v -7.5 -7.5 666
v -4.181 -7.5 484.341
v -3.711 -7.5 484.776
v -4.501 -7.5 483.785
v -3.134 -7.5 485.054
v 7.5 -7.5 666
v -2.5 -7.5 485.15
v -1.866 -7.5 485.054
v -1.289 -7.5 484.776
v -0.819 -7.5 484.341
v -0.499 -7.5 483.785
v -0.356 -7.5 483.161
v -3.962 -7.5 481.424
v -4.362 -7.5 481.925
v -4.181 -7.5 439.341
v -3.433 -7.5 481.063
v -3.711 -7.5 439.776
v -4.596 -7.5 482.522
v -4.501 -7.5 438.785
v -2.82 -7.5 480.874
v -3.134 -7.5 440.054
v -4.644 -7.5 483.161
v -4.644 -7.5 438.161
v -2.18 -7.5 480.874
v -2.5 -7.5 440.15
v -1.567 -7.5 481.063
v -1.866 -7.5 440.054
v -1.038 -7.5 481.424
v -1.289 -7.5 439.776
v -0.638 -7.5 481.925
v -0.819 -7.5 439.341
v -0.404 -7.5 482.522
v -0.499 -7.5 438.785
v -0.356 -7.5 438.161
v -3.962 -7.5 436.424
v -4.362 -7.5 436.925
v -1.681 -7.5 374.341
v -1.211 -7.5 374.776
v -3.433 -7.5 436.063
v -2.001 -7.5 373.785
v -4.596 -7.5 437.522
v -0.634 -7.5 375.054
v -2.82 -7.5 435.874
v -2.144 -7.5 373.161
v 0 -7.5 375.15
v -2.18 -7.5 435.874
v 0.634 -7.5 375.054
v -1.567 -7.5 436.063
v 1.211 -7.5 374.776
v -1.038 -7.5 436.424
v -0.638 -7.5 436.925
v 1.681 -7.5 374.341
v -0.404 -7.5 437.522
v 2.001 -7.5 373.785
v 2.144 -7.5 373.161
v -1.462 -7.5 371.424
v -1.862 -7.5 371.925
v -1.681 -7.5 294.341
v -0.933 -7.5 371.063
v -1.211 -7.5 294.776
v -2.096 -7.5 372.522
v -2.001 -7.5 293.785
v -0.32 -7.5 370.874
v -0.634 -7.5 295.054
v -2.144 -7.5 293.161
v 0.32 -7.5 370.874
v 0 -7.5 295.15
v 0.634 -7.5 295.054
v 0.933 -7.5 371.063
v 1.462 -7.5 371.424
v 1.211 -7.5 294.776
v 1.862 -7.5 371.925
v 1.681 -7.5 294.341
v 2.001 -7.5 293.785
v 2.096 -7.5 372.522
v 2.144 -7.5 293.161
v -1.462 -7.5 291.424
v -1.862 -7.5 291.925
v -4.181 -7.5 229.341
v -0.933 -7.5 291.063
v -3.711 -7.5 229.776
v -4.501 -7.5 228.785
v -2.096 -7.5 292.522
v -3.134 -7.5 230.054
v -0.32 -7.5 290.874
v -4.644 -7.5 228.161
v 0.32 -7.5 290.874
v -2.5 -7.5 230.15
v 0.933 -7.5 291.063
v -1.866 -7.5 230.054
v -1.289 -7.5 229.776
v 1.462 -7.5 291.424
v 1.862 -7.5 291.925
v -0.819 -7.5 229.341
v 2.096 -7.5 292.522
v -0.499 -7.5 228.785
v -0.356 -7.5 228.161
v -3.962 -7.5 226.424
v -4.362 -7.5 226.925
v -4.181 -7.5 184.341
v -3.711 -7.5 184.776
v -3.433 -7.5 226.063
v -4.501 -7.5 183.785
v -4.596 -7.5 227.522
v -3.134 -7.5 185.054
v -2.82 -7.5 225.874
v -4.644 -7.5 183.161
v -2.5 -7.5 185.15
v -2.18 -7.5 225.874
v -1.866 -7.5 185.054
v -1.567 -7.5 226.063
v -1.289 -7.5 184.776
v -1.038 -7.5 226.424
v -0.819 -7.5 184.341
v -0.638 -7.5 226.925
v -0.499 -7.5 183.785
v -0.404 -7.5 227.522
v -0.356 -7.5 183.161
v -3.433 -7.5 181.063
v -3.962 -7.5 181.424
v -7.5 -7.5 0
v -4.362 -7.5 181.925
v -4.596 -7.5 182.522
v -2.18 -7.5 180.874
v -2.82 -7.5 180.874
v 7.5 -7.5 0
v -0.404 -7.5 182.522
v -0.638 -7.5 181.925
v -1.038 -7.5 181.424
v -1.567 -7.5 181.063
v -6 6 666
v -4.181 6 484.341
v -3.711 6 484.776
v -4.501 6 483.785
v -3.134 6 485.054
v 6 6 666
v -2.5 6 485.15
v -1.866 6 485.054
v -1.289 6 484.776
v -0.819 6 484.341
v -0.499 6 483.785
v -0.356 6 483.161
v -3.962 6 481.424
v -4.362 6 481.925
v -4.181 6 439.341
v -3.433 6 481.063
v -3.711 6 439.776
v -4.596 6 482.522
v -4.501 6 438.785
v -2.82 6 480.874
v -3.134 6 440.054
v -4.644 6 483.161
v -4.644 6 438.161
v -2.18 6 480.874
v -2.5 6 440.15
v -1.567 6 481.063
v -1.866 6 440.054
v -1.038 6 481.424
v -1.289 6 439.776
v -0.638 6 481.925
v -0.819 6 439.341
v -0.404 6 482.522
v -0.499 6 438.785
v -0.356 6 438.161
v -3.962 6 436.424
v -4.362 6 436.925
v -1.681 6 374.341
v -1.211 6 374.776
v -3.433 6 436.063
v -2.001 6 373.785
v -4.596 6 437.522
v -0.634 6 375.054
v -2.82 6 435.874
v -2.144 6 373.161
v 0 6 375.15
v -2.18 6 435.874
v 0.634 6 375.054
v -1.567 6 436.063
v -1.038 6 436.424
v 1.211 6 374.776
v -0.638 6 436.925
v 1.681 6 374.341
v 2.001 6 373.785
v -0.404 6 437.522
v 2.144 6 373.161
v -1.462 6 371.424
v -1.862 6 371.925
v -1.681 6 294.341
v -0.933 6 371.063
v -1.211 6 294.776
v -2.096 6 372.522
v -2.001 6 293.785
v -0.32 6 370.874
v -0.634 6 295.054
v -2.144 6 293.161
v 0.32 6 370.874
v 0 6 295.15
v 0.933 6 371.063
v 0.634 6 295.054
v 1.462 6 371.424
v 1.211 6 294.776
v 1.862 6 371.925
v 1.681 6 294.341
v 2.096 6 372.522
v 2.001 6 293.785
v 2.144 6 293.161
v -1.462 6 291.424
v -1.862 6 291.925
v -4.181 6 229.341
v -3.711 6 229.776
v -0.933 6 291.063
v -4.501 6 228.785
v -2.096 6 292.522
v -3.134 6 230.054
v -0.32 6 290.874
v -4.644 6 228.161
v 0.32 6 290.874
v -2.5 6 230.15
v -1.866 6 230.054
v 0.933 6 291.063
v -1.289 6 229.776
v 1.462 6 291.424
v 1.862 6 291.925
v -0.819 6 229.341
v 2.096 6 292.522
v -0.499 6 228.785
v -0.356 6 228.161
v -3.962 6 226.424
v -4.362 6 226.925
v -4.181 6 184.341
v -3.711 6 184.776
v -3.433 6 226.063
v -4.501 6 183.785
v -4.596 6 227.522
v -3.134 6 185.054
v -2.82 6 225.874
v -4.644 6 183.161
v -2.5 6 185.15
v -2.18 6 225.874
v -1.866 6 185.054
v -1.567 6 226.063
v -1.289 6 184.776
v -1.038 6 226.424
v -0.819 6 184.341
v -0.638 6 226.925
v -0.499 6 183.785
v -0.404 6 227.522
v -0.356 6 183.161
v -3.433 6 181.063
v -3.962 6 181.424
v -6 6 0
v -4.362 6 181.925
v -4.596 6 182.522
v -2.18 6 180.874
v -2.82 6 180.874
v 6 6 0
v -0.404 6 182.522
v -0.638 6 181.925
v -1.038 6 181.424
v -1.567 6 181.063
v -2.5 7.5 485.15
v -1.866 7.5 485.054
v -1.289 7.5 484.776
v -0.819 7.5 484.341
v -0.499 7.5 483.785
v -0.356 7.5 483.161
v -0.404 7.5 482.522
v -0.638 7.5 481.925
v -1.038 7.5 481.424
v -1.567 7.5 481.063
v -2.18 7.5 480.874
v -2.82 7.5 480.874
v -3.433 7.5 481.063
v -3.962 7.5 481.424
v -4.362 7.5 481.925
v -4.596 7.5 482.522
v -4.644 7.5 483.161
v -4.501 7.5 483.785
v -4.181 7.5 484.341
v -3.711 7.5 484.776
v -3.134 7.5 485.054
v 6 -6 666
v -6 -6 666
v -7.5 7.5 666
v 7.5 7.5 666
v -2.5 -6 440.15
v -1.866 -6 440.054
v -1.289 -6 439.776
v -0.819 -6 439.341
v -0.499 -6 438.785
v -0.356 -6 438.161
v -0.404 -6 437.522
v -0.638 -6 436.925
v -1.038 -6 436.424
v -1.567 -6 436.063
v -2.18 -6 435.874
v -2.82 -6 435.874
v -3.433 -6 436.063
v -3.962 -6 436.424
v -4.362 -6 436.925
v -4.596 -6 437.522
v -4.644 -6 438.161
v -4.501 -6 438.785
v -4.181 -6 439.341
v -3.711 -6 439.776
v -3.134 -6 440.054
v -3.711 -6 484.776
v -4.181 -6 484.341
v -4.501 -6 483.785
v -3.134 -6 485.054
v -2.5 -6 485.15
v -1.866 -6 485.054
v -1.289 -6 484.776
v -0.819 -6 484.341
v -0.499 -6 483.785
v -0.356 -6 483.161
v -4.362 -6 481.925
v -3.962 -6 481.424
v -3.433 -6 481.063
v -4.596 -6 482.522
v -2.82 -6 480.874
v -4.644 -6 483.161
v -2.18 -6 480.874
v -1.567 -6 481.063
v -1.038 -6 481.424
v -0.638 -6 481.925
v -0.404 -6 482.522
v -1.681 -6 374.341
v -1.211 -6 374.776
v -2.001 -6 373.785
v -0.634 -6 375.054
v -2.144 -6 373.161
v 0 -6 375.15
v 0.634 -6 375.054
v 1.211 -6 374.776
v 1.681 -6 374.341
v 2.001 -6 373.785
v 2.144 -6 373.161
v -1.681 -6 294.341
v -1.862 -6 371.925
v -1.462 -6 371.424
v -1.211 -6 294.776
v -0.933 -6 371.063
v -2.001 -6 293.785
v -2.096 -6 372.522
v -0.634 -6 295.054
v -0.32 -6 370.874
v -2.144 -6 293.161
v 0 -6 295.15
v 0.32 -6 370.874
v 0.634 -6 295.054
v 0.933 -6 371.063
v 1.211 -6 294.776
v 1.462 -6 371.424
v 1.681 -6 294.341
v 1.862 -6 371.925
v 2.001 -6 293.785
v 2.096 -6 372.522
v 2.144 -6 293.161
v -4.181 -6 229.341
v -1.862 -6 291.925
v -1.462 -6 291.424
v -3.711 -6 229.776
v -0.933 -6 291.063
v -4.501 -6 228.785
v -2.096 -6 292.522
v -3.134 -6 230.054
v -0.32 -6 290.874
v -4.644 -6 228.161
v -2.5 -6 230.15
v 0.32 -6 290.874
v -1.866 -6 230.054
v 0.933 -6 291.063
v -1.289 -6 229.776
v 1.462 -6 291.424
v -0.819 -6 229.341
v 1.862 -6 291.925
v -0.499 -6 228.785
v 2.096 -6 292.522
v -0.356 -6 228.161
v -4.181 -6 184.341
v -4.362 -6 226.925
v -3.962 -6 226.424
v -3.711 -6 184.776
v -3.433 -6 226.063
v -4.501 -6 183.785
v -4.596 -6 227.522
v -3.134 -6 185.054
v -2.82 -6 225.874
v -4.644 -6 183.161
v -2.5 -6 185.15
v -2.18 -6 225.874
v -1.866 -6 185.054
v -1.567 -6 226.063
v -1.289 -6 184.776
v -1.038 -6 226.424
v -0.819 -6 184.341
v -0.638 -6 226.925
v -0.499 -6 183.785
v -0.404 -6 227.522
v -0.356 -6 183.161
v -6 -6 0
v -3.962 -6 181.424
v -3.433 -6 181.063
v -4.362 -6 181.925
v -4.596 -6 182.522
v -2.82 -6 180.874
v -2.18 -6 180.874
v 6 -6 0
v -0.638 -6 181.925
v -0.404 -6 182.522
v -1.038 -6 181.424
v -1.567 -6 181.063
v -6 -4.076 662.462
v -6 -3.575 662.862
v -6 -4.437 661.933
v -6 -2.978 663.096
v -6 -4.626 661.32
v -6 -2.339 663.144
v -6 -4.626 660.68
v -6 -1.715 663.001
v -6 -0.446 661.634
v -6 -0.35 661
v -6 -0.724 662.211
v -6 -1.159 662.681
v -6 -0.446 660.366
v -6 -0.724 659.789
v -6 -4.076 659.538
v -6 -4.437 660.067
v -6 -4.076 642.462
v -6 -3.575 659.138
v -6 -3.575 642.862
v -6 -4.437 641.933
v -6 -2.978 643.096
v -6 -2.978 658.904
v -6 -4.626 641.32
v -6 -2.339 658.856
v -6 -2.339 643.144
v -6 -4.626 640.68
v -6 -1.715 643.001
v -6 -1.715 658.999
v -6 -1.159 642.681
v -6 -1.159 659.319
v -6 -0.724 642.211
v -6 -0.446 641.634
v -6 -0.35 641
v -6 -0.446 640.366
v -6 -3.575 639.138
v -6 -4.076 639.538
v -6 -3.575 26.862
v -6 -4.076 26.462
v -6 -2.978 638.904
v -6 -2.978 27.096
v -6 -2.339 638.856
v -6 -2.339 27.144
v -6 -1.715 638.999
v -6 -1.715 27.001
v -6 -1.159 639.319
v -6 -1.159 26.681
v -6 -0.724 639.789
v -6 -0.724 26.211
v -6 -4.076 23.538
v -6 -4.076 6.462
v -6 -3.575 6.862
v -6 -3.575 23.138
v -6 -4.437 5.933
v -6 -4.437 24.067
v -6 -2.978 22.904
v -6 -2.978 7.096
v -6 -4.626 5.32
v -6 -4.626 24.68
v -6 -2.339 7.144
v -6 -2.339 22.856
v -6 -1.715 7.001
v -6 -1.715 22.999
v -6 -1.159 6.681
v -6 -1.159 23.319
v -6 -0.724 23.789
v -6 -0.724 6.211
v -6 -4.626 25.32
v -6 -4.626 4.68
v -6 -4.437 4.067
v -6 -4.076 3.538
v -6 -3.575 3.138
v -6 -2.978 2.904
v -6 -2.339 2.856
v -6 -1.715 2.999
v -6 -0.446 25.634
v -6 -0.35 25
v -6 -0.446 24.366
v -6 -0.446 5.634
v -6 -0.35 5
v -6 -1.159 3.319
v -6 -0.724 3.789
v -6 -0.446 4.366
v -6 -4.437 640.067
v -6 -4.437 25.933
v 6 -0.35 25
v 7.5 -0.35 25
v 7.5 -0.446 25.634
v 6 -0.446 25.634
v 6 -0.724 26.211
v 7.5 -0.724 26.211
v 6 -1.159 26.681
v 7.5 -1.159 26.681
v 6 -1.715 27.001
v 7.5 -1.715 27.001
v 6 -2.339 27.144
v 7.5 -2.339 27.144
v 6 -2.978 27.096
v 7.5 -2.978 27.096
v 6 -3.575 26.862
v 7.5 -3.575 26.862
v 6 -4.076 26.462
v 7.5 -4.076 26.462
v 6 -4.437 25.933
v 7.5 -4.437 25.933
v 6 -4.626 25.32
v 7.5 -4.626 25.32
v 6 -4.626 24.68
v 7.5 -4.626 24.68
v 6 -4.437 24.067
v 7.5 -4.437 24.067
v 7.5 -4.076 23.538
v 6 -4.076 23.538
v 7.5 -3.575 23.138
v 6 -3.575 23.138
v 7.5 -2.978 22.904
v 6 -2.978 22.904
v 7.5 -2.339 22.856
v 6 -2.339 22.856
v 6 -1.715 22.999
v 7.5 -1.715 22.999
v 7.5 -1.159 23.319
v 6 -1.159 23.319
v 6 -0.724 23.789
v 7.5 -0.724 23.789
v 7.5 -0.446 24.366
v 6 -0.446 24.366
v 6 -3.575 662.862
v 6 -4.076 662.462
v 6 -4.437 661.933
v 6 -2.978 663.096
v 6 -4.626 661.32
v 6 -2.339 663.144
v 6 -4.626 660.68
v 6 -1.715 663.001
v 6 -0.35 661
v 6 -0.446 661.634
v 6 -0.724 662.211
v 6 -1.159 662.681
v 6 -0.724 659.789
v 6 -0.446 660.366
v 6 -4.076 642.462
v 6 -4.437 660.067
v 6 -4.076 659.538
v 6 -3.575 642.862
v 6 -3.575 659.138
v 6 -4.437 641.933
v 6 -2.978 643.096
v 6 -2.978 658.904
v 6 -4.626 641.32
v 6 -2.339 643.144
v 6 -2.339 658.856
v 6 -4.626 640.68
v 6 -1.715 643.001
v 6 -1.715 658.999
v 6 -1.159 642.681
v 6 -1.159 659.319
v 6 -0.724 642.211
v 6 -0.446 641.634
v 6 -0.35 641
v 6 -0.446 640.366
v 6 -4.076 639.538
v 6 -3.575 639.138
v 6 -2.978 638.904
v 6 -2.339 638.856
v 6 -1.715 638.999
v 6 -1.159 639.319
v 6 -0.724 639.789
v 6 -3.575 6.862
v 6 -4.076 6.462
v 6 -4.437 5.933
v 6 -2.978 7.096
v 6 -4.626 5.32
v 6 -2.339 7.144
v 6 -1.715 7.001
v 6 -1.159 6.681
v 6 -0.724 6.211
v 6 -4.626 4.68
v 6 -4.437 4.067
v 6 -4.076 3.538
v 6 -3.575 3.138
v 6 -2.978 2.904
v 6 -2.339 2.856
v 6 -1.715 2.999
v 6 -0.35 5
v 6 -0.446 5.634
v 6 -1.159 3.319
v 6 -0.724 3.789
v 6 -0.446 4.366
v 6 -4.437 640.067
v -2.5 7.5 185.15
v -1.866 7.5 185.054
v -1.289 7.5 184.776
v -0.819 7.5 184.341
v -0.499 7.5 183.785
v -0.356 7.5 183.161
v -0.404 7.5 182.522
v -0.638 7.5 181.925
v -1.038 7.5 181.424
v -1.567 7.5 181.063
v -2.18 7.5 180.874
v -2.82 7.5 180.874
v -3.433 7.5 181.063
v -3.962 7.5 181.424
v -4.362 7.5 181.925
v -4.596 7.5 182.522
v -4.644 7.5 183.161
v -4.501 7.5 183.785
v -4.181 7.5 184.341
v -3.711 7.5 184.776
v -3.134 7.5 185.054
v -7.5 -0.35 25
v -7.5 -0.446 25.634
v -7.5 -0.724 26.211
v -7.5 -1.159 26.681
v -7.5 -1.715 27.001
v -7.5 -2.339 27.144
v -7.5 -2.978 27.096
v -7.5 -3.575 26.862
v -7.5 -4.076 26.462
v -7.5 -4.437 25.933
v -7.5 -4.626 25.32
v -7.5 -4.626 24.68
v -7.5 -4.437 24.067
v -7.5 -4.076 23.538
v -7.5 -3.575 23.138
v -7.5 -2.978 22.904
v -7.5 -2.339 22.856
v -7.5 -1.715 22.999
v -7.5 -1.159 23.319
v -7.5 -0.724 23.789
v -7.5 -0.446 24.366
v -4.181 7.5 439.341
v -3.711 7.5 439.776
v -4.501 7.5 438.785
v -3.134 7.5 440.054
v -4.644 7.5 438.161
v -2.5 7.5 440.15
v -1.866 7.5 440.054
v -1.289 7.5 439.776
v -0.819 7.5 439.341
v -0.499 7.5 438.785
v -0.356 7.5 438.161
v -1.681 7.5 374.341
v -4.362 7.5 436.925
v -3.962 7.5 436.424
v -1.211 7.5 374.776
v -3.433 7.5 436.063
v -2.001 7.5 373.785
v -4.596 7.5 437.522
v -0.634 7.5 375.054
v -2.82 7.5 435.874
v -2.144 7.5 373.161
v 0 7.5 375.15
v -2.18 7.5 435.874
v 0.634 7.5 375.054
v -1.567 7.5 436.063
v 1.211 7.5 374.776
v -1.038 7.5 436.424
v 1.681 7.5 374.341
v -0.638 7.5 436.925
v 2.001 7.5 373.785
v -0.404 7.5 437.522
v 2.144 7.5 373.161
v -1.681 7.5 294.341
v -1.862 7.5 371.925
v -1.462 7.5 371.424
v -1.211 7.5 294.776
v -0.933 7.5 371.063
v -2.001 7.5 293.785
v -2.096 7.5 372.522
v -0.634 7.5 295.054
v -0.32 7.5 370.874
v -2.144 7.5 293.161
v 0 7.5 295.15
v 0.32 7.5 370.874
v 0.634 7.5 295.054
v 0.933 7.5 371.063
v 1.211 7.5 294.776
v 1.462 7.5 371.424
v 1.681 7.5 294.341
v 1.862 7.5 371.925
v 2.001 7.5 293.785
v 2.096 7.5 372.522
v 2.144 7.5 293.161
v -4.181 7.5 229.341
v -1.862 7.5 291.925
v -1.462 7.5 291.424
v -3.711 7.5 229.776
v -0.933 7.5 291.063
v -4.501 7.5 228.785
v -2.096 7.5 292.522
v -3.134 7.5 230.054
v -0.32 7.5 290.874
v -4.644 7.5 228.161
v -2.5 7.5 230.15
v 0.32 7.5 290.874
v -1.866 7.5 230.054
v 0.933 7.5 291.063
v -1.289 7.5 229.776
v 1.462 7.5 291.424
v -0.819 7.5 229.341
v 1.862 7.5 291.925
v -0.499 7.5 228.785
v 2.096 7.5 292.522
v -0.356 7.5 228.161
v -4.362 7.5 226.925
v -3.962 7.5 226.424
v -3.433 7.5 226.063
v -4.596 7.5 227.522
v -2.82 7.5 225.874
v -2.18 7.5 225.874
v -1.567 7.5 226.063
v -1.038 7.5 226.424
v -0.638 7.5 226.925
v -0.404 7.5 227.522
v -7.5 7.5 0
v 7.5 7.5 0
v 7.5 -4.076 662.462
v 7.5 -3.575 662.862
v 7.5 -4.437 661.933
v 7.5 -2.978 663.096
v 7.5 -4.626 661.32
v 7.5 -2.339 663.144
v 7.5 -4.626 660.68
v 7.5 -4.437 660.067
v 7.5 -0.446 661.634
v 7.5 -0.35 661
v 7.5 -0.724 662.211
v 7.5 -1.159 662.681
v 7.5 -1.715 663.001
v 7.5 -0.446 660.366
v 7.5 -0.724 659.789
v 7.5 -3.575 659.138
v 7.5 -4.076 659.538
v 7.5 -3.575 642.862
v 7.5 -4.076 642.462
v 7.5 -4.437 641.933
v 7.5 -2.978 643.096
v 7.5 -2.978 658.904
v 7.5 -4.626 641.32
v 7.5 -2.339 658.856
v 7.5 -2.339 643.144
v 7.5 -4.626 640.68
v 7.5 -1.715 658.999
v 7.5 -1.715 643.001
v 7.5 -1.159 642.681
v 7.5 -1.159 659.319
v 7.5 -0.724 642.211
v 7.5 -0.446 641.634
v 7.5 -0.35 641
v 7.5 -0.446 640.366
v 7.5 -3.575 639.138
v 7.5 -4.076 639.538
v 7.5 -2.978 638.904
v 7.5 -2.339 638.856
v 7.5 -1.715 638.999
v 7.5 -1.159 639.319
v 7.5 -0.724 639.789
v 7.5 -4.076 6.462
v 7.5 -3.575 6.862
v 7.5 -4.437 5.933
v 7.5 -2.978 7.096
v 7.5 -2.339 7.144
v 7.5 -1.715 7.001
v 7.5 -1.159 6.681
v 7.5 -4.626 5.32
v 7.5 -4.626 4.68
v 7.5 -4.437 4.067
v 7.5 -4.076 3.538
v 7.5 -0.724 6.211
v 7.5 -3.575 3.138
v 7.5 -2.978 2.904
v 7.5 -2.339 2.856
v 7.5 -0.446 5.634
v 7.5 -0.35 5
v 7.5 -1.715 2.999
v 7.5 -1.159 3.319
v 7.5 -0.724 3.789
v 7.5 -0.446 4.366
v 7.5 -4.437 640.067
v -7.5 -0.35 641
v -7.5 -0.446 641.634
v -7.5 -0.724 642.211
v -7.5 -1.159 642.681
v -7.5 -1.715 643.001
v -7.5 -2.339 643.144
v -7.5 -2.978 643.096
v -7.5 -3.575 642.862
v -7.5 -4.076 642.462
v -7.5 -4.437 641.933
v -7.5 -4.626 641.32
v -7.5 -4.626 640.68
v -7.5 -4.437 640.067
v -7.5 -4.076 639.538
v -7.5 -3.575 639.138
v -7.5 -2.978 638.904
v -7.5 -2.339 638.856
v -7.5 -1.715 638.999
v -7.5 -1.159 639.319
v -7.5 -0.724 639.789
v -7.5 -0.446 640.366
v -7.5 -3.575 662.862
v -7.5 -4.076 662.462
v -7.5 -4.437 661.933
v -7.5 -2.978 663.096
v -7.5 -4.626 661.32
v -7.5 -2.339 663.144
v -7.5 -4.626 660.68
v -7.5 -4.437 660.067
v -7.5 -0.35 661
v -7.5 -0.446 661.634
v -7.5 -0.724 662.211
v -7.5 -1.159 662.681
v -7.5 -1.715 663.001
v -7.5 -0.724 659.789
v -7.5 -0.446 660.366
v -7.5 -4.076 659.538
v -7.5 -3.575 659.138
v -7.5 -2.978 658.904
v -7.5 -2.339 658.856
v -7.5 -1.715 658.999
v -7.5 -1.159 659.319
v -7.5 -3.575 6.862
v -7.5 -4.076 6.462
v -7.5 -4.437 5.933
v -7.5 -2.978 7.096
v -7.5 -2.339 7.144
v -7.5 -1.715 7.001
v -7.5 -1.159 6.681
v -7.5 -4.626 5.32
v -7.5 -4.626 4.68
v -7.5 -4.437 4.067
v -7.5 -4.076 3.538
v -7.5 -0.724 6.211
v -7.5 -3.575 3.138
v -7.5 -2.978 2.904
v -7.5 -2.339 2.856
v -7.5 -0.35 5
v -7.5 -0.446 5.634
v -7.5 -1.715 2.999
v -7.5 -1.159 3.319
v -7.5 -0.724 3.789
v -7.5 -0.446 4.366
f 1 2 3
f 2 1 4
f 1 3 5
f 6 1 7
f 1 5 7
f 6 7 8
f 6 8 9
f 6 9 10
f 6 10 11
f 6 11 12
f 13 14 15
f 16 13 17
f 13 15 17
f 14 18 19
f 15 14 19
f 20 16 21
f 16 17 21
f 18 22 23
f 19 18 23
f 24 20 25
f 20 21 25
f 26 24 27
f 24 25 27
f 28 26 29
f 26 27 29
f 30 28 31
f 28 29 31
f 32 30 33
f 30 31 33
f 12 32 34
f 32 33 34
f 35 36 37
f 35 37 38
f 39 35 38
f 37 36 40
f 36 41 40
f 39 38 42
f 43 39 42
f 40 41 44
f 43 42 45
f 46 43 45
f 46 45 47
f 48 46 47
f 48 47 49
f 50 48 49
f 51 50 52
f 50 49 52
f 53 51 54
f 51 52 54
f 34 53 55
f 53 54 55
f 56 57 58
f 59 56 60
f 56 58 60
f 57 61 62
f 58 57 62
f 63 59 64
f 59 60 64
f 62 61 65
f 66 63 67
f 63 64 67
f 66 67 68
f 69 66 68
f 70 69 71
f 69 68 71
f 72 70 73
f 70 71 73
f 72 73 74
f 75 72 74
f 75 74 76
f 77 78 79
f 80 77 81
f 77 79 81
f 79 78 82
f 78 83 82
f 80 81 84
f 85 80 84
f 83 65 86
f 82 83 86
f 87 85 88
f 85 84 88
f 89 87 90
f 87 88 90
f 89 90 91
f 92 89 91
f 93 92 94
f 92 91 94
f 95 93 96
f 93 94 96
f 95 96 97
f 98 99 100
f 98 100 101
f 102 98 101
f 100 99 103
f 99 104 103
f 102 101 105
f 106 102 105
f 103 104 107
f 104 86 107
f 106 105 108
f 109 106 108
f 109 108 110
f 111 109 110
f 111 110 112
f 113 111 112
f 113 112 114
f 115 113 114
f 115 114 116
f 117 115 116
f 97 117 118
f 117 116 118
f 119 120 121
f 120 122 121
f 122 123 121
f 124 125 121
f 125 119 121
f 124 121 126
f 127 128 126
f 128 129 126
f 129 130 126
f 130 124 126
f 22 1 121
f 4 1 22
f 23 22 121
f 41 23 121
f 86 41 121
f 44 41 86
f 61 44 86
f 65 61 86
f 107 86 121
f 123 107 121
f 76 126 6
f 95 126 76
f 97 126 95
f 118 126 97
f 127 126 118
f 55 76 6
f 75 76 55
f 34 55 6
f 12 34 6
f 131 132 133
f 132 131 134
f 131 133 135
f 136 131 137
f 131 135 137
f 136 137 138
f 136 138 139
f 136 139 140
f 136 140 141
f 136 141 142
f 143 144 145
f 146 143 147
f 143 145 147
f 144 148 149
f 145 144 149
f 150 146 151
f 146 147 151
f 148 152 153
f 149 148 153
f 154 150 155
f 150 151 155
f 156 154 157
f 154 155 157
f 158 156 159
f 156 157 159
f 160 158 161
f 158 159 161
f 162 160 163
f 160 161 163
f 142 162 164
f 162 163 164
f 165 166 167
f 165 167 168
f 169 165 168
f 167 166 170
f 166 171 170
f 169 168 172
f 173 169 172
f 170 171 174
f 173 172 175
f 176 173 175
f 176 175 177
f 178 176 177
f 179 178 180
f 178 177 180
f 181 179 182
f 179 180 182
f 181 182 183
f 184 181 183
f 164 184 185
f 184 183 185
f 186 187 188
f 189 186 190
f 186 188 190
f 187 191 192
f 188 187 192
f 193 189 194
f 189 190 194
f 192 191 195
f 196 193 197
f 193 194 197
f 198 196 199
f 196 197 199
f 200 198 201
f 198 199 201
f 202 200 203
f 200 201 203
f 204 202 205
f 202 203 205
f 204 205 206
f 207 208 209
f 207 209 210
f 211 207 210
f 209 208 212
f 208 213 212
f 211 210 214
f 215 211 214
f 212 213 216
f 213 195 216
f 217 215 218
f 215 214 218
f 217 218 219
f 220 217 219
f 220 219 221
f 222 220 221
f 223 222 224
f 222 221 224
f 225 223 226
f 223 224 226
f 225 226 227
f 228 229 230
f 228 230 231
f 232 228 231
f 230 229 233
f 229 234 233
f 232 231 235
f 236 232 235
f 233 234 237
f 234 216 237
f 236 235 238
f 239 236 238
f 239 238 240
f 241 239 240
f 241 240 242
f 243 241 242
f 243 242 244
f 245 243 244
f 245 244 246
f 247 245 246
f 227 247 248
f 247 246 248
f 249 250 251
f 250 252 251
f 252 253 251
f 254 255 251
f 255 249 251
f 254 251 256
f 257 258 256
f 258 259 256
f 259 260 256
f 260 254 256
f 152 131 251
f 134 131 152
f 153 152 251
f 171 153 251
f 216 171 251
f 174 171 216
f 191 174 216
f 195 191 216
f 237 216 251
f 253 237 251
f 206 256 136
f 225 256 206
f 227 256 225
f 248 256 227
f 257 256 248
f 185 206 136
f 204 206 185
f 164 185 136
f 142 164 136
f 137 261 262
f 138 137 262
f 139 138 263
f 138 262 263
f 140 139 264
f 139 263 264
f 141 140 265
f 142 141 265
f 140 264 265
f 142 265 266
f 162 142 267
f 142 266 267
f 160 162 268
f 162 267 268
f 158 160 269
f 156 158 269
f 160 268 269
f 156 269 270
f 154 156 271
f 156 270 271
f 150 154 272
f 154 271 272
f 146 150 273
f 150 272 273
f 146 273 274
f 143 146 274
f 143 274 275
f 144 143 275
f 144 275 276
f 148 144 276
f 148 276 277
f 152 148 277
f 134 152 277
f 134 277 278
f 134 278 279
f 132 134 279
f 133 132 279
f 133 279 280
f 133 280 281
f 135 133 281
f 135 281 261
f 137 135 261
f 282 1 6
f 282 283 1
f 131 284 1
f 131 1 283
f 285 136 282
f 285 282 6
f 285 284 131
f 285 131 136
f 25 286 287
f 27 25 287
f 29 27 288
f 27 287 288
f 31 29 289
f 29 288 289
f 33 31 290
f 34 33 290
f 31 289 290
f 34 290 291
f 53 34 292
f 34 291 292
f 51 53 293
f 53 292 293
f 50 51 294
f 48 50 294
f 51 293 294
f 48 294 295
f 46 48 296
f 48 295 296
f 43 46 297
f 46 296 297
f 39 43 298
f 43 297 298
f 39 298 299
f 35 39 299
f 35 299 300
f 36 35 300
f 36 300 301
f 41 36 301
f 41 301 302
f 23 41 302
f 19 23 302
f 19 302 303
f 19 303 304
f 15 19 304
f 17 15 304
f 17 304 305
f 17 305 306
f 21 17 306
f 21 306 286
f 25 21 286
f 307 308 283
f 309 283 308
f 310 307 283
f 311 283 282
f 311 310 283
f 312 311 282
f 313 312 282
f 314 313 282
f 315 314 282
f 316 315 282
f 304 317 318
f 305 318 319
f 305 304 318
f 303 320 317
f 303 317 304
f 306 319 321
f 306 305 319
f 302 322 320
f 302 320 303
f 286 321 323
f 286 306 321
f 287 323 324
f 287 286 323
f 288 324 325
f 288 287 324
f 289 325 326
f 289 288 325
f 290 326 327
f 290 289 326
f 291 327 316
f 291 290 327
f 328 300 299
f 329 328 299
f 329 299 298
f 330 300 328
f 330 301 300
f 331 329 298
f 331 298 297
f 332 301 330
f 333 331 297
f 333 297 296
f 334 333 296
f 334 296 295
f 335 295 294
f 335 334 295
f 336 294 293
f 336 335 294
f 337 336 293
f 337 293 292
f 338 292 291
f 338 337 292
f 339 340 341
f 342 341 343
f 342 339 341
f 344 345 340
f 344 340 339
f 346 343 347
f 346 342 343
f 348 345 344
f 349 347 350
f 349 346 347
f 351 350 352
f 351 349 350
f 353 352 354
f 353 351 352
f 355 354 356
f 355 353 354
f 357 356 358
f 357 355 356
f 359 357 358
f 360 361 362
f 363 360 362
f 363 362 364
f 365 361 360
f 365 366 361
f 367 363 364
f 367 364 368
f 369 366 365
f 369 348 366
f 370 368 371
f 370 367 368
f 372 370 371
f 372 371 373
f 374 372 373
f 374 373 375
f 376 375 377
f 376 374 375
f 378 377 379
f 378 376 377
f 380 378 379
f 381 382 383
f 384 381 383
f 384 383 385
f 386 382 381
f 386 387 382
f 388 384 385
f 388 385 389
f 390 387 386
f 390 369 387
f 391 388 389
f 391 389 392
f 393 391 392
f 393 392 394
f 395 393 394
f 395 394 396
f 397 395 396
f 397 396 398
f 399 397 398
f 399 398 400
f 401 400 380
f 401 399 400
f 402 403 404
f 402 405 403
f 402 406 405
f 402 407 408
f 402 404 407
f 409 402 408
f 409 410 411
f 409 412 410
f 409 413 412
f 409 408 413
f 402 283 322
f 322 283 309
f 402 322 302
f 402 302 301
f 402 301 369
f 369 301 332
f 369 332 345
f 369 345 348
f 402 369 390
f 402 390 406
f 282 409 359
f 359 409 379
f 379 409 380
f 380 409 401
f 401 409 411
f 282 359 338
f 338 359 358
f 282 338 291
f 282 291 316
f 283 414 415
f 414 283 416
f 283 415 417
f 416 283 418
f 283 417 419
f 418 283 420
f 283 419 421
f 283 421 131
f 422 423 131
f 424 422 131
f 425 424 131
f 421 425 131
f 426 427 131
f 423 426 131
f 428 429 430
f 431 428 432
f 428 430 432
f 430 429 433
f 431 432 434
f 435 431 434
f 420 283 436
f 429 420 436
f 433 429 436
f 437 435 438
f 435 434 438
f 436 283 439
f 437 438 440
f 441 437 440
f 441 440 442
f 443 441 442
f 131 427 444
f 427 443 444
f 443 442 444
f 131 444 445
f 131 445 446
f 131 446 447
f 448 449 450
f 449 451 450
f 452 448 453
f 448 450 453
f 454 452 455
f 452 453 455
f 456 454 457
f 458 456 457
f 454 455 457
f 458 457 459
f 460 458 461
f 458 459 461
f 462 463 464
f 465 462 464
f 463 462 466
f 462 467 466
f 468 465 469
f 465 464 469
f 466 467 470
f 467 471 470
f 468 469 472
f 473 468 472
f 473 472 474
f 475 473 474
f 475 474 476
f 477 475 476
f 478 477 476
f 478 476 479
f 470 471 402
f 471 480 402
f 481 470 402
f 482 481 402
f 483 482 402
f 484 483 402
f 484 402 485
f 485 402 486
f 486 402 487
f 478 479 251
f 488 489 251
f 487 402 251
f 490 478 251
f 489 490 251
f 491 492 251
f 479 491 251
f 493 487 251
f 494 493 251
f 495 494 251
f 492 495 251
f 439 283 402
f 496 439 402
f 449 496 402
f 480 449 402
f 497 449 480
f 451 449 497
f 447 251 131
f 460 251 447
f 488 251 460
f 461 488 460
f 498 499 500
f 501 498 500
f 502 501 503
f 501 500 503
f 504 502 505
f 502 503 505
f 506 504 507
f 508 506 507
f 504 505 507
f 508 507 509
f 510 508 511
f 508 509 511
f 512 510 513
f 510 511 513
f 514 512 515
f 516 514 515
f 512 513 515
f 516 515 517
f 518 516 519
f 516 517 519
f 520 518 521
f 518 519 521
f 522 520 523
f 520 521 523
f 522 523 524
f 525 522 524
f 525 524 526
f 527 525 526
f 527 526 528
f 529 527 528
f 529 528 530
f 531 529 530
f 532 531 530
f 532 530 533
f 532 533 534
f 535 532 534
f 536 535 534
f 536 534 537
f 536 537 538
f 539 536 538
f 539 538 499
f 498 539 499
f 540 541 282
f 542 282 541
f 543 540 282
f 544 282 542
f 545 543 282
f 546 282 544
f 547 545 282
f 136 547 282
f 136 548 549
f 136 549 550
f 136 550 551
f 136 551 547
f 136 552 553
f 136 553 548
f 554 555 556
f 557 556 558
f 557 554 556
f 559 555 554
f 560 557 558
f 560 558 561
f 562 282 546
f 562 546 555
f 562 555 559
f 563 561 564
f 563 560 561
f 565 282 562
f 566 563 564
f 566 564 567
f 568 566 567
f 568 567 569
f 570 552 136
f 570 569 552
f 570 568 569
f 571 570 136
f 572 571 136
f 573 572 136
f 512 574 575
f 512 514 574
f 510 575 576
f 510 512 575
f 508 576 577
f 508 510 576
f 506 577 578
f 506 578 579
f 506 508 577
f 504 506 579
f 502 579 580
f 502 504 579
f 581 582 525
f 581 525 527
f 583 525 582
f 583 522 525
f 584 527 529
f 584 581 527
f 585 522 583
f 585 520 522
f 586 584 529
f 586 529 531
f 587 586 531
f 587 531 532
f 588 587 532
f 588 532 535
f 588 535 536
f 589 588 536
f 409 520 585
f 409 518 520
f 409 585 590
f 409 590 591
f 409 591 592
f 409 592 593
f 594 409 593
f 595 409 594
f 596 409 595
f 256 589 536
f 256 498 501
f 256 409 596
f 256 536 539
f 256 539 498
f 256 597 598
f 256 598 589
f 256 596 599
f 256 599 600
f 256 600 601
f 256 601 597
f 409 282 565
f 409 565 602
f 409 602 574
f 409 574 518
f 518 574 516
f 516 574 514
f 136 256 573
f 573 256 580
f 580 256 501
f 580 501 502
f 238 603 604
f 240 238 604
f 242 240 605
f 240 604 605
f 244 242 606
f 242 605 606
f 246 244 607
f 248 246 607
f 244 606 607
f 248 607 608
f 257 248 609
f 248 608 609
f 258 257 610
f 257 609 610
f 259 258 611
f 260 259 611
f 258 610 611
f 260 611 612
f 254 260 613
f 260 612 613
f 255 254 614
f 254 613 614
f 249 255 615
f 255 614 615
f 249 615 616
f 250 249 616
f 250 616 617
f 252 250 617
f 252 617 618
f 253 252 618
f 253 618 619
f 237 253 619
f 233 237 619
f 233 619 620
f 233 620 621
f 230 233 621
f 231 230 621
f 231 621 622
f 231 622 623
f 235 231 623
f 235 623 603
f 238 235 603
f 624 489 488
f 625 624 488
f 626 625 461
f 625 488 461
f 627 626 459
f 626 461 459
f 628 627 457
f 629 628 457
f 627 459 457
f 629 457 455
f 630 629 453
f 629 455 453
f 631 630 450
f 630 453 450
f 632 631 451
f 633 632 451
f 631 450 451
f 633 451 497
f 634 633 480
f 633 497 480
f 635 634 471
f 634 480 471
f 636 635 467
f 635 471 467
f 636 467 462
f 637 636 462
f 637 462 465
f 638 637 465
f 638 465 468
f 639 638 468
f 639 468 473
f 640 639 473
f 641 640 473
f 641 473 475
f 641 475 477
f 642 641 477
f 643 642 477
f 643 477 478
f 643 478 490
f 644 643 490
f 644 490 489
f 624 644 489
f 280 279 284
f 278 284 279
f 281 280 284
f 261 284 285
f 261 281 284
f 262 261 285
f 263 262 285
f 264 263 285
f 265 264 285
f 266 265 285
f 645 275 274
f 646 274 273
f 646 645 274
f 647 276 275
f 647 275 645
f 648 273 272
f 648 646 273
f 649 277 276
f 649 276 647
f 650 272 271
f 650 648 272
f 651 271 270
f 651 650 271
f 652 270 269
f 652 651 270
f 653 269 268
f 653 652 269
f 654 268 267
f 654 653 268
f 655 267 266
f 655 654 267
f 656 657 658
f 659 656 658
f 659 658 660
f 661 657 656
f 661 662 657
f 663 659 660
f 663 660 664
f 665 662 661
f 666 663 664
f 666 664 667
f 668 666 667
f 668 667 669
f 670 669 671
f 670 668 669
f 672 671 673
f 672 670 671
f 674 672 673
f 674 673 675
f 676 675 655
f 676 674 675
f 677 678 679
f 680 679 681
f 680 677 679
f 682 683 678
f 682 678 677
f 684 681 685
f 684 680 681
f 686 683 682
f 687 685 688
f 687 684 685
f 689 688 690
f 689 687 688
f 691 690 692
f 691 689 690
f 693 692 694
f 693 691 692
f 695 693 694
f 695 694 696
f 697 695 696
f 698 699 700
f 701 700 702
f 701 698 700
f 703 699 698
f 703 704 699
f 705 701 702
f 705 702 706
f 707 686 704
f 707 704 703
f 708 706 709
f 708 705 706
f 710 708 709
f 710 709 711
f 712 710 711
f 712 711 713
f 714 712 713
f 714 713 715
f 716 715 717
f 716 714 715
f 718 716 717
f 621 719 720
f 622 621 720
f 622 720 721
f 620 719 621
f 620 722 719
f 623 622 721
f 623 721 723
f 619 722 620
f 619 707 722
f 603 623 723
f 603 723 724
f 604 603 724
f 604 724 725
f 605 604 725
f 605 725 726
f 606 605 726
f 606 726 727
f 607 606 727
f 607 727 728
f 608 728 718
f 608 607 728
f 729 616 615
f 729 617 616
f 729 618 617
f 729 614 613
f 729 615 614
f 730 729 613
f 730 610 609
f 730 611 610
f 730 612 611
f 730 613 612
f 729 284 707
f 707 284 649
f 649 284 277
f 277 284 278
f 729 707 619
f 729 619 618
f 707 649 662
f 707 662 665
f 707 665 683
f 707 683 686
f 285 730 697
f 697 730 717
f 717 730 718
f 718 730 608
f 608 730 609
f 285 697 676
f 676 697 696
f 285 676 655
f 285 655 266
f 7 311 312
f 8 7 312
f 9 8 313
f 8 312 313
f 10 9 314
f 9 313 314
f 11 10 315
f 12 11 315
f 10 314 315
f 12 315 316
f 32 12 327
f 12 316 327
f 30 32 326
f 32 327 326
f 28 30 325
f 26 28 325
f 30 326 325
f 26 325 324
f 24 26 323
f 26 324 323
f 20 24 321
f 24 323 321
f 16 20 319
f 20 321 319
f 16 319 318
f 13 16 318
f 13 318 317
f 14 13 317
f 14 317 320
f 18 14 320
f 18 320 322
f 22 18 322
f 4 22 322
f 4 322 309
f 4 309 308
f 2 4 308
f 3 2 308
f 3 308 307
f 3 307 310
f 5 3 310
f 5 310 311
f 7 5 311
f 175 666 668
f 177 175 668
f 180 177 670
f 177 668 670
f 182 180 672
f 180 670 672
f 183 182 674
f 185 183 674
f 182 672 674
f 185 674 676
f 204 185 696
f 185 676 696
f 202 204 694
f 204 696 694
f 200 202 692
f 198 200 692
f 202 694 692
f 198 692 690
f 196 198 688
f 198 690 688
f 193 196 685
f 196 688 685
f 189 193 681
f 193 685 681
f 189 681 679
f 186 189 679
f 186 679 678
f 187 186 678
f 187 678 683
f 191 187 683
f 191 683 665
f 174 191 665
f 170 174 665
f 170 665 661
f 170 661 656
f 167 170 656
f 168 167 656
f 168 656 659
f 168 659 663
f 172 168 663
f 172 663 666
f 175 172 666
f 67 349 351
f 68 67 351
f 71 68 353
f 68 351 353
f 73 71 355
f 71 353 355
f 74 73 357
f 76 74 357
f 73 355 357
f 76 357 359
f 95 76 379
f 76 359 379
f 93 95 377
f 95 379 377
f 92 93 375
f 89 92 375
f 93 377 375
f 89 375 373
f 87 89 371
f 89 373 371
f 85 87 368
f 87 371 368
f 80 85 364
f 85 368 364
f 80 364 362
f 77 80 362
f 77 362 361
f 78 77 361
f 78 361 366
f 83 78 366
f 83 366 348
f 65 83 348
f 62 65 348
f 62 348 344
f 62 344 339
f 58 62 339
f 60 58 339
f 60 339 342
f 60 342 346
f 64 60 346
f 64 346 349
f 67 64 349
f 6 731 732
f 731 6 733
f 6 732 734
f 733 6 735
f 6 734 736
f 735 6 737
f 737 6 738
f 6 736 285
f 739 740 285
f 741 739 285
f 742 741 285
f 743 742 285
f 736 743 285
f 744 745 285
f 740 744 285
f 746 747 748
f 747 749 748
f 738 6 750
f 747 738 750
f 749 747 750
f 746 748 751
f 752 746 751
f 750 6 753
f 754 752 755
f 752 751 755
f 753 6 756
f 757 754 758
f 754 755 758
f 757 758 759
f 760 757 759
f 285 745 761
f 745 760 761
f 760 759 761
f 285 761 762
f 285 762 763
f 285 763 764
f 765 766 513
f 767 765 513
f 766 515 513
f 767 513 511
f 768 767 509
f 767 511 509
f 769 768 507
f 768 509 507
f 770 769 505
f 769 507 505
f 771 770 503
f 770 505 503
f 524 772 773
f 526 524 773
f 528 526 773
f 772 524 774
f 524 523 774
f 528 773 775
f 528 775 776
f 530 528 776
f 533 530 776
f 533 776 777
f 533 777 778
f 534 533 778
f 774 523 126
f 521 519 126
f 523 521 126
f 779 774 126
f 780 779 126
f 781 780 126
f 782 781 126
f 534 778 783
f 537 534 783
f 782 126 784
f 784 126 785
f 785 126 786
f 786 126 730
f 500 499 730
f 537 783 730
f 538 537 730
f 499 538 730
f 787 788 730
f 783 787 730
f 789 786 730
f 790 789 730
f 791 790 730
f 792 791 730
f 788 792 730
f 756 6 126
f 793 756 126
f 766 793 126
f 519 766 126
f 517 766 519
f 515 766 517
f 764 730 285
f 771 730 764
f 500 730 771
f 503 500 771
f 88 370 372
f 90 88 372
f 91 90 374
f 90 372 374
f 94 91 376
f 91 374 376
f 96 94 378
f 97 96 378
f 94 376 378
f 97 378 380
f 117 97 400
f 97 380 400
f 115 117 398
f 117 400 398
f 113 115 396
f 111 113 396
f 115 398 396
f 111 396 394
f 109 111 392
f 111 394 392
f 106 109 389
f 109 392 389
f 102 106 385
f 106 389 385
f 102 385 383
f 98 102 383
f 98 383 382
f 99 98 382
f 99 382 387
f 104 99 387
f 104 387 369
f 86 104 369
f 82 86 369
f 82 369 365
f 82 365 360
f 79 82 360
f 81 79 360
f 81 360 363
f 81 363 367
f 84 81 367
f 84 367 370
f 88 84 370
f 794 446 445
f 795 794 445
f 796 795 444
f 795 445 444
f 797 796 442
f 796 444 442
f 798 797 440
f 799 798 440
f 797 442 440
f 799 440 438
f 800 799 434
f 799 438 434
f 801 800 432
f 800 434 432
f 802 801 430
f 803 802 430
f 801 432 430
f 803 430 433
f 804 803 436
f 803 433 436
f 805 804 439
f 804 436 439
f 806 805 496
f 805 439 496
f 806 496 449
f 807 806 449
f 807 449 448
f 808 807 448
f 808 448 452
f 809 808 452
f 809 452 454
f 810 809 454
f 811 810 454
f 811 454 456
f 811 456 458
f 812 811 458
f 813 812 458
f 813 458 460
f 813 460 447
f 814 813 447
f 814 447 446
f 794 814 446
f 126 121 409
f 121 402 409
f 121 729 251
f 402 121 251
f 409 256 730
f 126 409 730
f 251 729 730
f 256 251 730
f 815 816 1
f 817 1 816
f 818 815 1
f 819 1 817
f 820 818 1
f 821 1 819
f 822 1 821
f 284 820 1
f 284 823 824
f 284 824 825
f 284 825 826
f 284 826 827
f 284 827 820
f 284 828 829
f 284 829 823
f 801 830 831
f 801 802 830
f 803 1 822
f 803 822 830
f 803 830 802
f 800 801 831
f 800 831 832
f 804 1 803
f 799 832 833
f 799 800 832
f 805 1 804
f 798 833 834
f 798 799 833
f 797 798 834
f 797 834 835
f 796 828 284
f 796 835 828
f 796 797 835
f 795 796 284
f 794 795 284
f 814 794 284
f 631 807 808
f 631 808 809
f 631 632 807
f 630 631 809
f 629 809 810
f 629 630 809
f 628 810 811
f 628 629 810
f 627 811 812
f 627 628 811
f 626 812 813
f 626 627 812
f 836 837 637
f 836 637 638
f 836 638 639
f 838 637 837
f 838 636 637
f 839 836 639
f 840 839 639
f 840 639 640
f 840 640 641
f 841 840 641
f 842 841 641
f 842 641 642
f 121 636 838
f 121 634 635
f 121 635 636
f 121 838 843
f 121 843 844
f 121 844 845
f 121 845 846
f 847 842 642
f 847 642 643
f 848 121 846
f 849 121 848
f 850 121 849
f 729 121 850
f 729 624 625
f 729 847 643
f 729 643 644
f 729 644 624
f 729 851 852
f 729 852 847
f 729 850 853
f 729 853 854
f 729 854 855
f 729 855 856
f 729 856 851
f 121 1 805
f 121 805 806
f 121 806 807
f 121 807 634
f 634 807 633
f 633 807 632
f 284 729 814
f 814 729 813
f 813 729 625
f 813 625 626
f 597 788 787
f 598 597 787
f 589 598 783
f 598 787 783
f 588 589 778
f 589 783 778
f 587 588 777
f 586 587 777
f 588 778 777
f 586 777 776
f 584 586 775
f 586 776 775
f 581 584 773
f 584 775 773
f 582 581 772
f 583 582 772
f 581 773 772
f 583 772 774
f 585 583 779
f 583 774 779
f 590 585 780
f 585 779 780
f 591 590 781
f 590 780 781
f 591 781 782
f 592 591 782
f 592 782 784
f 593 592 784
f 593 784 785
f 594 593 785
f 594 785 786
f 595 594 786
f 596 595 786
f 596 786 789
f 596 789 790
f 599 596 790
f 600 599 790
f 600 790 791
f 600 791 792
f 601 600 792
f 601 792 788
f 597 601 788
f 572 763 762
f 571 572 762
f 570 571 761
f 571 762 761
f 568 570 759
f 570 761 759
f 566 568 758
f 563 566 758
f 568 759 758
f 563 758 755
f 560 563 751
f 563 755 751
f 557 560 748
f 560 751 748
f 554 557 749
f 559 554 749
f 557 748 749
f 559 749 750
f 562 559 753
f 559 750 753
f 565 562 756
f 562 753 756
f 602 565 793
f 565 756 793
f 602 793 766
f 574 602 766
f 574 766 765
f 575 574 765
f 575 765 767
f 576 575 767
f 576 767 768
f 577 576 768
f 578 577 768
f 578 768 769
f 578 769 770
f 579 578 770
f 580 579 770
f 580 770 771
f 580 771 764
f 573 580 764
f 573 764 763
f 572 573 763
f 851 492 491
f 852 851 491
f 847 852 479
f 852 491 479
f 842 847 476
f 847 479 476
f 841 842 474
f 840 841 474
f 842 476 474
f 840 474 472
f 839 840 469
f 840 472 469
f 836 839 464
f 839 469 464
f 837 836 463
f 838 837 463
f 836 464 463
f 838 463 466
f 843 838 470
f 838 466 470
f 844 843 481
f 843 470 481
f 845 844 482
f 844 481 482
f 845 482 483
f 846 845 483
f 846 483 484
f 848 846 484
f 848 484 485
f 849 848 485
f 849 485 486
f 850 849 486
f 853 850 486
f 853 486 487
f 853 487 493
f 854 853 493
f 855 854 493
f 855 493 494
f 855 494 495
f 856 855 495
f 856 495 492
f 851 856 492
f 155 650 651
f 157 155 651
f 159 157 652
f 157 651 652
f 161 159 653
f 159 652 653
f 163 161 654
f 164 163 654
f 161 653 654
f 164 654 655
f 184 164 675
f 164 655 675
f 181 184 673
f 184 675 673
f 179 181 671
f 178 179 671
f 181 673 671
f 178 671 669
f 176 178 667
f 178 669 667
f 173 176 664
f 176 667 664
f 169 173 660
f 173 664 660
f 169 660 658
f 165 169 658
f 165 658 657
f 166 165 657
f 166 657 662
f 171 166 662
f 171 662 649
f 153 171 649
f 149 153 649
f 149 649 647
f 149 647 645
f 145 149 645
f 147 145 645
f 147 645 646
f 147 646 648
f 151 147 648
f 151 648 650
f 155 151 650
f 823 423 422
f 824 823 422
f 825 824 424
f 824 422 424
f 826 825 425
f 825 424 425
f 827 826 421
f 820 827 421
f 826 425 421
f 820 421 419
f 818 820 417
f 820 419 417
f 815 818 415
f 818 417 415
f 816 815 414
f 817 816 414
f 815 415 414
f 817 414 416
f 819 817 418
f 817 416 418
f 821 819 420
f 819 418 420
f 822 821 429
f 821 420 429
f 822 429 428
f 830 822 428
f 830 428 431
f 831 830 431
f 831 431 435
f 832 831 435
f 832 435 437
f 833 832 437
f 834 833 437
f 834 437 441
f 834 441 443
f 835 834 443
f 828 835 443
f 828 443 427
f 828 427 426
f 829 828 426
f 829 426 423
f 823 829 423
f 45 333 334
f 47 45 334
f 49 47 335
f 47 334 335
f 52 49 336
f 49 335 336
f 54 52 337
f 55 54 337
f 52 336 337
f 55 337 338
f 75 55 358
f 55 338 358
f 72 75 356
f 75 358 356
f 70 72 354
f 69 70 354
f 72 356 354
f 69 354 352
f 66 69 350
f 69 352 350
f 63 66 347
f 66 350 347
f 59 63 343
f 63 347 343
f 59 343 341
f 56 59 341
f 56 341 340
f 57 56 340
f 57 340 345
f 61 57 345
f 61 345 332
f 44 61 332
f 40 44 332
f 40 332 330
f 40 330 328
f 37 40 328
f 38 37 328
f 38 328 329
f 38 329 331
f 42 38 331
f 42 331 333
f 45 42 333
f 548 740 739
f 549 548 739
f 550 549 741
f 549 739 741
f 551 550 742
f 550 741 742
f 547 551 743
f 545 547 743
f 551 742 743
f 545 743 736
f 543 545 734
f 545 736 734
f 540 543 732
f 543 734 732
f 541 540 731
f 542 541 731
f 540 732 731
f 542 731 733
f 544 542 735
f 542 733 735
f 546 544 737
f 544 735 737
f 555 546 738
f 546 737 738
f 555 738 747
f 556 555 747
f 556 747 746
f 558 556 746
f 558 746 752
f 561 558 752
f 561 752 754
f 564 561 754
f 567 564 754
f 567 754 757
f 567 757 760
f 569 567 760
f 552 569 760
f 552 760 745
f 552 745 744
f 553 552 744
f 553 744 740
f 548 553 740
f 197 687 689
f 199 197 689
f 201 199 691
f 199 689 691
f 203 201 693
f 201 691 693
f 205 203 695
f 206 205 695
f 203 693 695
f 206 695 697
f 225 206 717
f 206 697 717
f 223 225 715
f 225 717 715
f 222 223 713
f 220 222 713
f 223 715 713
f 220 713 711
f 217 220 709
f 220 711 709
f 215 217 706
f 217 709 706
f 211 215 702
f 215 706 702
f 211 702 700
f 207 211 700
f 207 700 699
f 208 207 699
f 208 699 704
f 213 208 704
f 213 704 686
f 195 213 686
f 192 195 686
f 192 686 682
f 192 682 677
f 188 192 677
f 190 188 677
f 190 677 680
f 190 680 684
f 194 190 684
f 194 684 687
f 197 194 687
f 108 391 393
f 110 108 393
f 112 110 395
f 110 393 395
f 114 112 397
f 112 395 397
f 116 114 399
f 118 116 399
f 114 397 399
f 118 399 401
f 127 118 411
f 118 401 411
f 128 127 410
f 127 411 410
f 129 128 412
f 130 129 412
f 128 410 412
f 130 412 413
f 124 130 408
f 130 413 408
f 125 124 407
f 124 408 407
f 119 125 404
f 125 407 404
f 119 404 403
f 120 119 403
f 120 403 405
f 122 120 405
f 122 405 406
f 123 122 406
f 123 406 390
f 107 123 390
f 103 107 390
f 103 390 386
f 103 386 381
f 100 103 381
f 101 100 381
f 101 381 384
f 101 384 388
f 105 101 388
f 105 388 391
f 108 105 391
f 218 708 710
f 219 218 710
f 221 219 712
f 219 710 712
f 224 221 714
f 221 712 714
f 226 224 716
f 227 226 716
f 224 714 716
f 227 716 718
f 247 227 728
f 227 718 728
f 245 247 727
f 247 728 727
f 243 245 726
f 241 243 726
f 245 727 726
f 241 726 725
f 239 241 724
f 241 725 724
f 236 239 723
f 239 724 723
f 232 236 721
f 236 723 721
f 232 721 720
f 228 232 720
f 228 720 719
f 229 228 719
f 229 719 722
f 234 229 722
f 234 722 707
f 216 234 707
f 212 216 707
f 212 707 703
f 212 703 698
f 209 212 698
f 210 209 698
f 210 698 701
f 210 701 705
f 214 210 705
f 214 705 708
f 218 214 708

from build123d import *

# Parameters (mm, degrees)
SKETCH_1_W          = 15
SKETCH_1_H          = 15
SKETCH_1_W_2        = 12
SKETCH_1_H_2        = 12
EXTRUDE_1_DEPTH     = 666
SKETCH_2_R          = 2.15
CUT_EXTRUDE_1_DEPTH = 667.211115188
SKETCH_3_R          = 2.15
CUT_EXTRUDE_2_DEPTH = 667.211115188


with BuildPart() as part:
    # ｽｹｯﾁ1 → 押し出し-薄板1 (new body)
    with BuildSketch(Plane.XY):
        Rectangle(SKETCH_1_W, SKETCH_1_H)
        Rectangle(SKETCH_1_W_2, SKETCH_1_H_2, mode=Mode.SUBTRACT)
    extrude(amount=EXTRUDE_1_DEPTH)

    # ｽｹｯﾁ2 → ｶｯﾄ - 押し出し1 (cut, through all)
    with BuildSketch(Plane(origin=(7.5, 0, 0), x_dir=(0, 0, -1), z_dir=(1, 0, 0))):
        with Locations(Location((-5, -2.5, 0), (0, 0, 90))):
            Circle(SKETCH_2_R)
        with Locations(Location((-661, -2.5, 0), (0, 0, 90))):
            Circle(SKETCH_2_R)
        with Locations(Location((-25, -2.5, 0), (0, 0, 90))):
            Circle(SKETCH_2_R)
        with Locations(Location((-641, -2.5, 0), (0, 0, 90))):
            Circle(SKETCH_2_R)
    extrude(amount=-CUT_EXTRUDE_1_DEPTH, mode=Mode.SUBTRACT)

    # ｽｹｯﾁ3 → ｶｯﾄ - 押し出し2 (cut, through all)
    with BuildSketch(Plane(origin=(0, 7.5, 0), x_dir=(1, 0, 0), z_dir=(0, 1, 0))):
        with Locations(Location((-2.5, -228, 0), (0, 0, 270))):
            Circle(SKETCH_3_R)
        with Locations(Location((-2.5, -438, 0), (0, 0, 270))):
            Circle(SKETCH_3_R)
        with Locations(Location((-2.5, -183, 0), (0, 0, 270))):
            Circle(SKETCH_3_R)
        with Locations(Location((-2.5, -483, 0), (0, 0, 270))):
            Circle(SKETCH_3_R)
        with Locations(Location((0, -373, 0), (0, 0, 270))):
            Circle(SKETCH_3_R)
        with Locations(Location((0, -293, 0), (0, 0, 270))):
            Circle(SKETCH_3_R)
    extrude(amount=-CUT_EXTRUDE_2_DEPTH, mode=Mode.SUBTRACT)


solid = part.part
